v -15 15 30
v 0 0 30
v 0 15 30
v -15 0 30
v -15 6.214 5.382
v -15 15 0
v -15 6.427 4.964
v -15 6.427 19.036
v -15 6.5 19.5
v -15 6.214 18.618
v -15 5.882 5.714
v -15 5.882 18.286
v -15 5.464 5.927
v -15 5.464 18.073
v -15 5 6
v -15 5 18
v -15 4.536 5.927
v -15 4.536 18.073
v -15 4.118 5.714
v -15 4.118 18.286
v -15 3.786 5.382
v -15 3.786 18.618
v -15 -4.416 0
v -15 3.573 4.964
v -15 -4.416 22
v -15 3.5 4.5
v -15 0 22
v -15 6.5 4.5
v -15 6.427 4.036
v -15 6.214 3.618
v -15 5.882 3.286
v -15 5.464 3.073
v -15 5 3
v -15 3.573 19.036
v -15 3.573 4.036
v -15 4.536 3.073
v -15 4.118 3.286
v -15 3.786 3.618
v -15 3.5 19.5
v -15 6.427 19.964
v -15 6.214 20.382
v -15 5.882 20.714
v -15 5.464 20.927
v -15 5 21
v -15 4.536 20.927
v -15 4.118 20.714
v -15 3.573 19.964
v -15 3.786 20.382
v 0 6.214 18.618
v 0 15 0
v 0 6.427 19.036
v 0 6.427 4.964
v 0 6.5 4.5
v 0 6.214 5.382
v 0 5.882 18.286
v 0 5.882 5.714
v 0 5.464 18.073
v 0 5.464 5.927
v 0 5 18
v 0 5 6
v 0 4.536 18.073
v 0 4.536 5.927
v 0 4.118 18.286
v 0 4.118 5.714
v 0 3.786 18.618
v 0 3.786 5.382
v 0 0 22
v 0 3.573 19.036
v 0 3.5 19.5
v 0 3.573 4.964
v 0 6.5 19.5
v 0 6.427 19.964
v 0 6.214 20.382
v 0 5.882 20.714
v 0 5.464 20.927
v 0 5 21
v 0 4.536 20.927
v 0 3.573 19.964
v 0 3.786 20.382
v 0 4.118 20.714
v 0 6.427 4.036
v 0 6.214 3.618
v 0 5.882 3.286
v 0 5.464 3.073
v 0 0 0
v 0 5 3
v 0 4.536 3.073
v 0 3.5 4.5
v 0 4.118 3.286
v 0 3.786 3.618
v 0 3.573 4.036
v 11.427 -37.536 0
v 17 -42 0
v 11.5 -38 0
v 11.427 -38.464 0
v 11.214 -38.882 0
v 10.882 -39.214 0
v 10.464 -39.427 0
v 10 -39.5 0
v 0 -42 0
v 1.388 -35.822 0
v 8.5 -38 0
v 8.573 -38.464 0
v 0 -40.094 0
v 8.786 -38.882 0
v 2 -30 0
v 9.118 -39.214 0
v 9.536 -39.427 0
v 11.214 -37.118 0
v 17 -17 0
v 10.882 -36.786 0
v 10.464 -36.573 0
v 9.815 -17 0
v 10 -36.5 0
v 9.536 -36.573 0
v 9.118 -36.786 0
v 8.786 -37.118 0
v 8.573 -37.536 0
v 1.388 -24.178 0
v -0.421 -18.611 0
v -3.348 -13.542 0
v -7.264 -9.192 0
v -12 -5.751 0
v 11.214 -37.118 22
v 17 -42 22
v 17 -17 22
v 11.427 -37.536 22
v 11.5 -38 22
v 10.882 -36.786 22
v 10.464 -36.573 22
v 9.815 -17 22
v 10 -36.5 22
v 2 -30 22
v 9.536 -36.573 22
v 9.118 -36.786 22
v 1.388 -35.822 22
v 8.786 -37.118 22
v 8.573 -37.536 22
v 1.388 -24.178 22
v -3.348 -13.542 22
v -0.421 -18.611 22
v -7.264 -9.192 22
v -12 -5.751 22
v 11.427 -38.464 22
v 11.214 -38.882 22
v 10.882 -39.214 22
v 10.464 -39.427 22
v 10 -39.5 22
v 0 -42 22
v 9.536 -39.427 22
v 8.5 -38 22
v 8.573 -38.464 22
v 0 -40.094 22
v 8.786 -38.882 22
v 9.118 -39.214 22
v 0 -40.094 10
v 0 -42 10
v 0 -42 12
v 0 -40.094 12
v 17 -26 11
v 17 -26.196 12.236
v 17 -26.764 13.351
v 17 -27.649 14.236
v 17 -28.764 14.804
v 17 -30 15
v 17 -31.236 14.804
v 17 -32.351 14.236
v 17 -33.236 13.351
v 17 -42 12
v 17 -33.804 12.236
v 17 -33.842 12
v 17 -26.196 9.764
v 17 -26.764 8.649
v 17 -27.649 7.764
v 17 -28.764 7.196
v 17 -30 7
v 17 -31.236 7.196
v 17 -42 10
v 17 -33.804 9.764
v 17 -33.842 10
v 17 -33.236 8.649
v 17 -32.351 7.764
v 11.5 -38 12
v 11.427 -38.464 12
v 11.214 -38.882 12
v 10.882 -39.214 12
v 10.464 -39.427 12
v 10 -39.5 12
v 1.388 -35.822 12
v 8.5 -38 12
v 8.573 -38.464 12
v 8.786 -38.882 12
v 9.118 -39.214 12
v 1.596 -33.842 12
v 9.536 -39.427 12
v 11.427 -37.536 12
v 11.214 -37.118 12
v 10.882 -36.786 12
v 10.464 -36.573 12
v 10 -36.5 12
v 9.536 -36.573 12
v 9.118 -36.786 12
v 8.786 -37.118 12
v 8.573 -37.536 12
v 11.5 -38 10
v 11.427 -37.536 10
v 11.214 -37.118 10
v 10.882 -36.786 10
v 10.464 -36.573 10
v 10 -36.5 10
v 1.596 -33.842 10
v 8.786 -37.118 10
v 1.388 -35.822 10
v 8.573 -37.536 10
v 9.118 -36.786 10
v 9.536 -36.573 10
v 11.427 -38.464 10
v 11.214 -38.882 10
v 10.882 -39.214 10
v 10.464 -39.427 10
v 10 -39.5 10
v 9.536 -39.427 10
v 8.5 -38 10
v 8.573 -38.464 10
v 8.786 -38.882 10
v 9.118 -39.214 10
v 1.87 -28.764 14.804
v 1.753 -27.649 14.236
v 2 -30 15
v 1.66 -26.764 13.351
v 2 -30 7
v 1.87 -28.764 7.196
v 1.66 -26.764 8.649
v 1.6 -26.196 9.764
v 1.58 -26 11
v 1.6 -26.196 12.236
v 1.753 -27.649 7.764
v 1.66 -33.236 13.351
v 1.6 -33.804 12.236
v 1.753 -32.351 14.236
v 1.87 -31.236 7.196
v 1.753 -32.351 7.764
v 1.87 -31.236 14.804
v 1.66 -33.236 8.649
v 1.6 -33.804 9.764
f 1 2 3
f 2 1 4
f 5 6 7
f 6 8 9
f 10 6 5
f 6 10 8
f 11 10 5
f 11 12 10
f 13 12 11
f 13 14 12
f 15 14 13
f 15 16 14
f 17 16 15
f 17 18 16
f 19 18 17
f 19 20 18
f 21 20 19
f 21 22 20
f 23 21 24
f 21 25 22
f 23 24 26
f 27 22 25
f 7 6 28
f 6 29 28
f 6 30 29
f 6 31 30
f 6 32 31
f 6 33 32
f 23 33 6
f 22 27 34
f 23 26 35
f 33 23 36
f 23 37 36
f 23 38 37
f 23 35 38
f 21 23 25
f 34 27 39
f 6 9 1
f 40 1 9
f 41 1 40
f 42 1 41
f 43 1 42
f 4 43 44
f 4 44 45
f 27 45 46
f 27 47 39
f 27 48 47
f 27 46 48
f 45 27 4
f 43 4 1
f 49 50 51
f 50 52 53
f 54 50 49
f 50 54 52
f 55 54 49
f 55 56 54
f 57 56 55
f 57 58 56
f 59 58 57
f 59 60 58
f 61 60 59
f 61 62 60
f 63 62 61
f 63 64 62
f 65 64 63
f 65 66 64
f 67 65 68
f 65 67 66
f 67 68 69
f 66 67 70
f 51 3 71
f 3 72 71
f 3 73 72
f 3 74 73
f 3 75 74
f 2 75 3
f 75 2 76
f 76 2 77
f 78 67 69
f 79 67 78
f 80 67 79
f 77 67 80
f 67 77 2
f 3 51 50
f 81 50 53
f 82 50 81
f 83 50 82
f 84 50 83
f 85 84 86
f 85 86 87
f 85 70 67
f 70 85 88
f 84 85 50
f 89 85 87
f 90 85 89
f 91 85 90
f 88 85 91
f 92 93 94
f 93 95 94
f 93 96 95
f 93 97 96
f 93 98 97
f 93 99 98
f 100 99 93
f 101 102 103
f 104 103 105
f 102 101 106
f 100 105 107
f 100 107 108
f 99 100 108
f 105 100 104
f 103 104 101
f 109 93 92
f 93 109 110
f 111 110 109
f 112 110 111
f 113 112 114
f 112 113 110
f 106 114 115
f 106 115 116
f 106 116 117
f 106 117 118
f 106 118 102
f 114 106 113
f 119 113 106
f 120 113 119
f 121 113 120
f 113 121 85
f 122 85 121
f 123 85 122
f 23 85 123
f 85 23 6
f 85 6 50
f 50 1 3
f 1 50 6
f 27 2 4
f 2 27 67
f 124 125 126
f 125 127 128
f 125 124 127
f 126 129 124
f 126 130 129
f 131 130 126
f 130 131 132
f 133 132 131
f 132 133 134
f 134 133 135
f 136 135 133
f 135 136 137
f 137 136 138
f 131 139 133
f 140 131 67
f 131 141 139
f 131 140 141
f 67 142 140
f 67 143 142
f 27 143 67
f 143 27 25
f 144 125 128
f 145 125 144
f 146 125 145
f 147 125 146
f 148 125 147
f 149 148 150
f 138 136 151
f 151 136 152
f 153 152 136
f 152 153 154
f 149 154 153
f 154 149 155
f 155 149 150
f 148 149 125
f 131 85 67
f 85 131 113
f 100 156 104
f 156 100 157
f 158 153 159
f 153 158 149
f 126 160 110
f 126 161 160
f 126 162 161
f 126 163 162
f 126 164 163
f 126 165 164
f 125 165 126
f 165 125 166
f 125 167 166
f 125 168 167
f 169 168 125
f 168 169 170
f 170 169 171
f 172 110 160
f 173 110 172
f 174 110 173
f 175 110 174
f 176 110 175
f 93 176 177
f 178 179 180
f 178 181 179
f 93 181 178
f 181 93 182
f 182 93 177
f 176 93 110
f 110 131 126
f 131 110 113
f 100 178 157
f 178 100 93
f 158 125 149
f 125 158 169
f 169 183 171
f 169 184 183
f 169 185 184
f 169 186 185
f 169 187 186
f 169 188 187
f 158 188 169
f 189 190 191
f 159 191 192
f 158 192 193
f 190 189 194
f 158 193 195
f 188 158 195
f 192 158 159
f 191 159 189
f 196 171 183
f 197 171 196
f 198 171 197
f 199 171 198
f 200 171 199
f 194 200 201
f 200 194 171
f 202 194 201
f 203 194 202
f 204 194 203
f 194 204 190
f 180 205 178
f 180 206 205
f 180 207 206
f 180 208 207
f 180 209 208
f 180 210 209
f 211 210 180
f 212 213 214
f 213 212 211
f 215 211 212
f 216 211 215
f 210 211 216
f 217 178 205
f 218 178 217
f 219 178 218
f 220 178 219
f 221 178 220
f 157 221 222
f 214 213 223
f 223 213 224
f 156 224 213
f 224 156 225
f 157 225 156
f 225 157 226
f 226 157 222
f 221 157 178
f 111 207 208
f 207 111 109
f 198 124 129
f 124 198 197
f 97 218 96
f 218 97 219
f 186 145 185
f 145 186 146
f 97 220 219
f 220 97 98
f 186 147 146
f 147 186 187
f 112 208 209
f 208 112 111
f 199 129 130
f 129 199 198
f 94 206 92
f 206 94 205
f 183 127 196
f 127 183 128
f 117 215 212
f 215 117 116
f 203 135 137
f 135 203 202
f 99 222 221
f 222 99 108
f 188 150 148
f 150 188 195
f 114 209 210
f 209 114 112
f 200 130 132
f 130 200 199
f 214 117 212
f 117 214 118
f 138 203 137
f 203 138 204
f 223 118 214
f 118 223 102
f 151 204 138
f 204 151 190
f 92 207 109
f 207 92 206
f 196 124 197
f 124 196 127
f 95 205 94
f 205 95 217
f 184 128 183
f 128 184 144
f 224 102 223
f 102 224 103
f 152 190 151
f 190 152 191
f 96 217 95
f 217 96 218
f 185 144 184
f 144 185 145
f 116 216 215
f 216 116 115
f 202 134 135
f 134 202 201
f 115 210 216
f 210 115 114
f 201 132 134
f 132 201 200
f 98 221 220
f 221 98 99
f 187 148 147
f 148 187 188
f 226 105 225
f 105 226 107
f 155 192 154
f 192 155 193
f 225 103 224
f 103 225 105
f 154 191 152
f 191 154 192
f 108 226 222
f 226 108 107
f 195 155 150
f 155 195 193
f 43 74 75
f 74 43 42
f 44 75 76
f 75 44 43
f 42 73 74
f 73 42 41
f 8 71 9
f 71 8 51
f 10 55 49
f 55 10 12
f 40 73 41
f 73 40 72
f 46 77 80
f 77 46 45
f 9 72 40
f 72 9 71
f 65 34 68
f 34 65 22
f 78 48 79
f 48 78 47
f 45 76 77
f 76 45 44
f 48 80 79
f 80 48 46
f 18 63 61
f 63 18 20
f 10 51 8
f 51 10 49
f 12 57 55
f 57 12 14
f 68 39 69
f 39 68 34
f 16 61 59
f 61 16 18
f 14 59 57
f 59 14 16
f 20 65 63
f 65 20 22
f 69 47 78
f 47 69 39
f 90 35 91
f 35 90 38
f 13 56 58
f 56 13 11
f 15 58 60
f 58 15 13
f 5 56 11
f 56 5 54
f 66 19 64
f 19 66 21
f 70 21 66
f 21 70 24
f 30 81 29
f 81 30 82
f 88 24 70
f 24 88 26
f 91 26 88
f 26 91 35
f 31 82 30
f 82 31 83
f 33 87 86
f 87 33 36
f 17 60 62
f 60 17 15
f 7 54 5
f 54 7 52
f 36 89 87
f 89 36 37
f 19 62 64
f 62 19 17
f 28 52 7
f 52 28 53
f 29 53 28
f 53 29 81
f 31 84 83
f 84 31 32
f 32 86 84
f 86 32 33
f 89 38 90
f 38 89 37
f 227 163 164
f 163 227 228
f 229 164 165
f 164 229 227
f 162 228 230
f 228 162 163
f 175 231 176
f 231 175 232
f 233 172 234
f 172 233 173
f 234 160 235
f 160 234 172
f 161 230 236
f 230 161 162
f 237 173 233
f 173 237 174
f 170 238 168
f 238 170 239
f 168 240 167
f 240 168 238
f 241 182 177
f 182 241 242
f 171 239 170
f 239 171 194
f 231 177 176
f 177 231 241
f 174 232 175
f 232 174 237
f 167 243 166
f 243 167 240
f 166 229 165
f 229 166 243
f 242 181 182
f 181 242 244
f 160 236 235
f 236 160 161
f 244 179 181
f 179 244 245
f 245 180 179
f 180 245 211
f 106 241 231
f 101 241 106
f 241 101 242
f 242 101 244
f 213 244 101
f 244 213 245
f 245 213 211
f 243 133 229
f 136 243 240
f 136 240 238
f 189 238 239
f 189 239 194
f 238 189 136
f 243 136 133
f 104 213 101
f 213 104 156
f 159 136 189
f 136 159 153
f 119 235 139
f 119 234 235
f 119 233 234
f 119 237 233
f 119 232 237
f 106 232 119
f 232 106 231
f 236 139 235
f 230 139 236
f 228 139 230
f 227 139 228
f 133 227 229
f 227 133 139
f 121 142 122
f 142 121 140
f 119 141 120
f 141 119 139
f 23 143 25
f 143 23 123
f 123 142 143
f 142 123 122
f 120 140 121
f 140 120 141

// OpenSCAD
//Upright or Sideways (whichever you feel works best with your support needs/capabilities)
Orientation="Sideways";//[Upright,Sideways]

//Clamp (Requires support)
Clamp="True";//[True,False]

//Units
Units=1;//[1:mm,25.4:inches]

//Diameter of the stem where inserted into the holder
Stem_Diameter=8;

//Diameter of the dial bezel
Bezel_Diameter=56;

Stem_Radius = Stem_Diameter * Units * 0.5;
Bezel_Radius = Bezel_Diameter * Units * 0.5;

module block(){
	union(){
		translate([-12,0,0])
		cube([30,15,15]);

		translate([-12,-17,0])
		cube([22,18,15]);

		rotate(30,[1,0,0])
		translate([-12,-20,0])
		cube([22,20,15]);

		translate([-12,-42,-17])
		cube([22,25,17]);
	}
}

module mill(){
	translate([7.5,5,-2])
	cylinder(r=1.5,h=25,$fn=20);
	translate([-7.5,5,-2])
	cylinder(r=1.5,h=25,$fn=20);

	translate([-1,-30,-20])
	cylinder(r=Stem_Radius,h=40,$fn=20);

	rotate(90,[0,1,0])
	translate([30-(2*Bezel_Radius),-30,0])
	cylinder(r=Bezel_Radius,h=25, center=true,$fn=30);

	if(Clamp=="True"){
		translate([-2,-54,-20])
		cube([2,25,25]);
		rotate(90,[0,1,0])
		translate([10,-38,-20])
		cylinder(r=1.5,h=40,$fn=20);
	}else{
		rotate(90,[0,1,0])
		translate([10,-30,-20])
		cylinder(r=1.5,h=40,$fn=20);
	}	
}

module dialholder(){
	difference(){
		block();
		mill();
	}
}

if(Orientation=="Sideways"){
	rotate(-90,[0,1,0])
	translate([12,0,0])
	dialholder();
}else{
	translate([0,0,17])
	dialholder();
}
